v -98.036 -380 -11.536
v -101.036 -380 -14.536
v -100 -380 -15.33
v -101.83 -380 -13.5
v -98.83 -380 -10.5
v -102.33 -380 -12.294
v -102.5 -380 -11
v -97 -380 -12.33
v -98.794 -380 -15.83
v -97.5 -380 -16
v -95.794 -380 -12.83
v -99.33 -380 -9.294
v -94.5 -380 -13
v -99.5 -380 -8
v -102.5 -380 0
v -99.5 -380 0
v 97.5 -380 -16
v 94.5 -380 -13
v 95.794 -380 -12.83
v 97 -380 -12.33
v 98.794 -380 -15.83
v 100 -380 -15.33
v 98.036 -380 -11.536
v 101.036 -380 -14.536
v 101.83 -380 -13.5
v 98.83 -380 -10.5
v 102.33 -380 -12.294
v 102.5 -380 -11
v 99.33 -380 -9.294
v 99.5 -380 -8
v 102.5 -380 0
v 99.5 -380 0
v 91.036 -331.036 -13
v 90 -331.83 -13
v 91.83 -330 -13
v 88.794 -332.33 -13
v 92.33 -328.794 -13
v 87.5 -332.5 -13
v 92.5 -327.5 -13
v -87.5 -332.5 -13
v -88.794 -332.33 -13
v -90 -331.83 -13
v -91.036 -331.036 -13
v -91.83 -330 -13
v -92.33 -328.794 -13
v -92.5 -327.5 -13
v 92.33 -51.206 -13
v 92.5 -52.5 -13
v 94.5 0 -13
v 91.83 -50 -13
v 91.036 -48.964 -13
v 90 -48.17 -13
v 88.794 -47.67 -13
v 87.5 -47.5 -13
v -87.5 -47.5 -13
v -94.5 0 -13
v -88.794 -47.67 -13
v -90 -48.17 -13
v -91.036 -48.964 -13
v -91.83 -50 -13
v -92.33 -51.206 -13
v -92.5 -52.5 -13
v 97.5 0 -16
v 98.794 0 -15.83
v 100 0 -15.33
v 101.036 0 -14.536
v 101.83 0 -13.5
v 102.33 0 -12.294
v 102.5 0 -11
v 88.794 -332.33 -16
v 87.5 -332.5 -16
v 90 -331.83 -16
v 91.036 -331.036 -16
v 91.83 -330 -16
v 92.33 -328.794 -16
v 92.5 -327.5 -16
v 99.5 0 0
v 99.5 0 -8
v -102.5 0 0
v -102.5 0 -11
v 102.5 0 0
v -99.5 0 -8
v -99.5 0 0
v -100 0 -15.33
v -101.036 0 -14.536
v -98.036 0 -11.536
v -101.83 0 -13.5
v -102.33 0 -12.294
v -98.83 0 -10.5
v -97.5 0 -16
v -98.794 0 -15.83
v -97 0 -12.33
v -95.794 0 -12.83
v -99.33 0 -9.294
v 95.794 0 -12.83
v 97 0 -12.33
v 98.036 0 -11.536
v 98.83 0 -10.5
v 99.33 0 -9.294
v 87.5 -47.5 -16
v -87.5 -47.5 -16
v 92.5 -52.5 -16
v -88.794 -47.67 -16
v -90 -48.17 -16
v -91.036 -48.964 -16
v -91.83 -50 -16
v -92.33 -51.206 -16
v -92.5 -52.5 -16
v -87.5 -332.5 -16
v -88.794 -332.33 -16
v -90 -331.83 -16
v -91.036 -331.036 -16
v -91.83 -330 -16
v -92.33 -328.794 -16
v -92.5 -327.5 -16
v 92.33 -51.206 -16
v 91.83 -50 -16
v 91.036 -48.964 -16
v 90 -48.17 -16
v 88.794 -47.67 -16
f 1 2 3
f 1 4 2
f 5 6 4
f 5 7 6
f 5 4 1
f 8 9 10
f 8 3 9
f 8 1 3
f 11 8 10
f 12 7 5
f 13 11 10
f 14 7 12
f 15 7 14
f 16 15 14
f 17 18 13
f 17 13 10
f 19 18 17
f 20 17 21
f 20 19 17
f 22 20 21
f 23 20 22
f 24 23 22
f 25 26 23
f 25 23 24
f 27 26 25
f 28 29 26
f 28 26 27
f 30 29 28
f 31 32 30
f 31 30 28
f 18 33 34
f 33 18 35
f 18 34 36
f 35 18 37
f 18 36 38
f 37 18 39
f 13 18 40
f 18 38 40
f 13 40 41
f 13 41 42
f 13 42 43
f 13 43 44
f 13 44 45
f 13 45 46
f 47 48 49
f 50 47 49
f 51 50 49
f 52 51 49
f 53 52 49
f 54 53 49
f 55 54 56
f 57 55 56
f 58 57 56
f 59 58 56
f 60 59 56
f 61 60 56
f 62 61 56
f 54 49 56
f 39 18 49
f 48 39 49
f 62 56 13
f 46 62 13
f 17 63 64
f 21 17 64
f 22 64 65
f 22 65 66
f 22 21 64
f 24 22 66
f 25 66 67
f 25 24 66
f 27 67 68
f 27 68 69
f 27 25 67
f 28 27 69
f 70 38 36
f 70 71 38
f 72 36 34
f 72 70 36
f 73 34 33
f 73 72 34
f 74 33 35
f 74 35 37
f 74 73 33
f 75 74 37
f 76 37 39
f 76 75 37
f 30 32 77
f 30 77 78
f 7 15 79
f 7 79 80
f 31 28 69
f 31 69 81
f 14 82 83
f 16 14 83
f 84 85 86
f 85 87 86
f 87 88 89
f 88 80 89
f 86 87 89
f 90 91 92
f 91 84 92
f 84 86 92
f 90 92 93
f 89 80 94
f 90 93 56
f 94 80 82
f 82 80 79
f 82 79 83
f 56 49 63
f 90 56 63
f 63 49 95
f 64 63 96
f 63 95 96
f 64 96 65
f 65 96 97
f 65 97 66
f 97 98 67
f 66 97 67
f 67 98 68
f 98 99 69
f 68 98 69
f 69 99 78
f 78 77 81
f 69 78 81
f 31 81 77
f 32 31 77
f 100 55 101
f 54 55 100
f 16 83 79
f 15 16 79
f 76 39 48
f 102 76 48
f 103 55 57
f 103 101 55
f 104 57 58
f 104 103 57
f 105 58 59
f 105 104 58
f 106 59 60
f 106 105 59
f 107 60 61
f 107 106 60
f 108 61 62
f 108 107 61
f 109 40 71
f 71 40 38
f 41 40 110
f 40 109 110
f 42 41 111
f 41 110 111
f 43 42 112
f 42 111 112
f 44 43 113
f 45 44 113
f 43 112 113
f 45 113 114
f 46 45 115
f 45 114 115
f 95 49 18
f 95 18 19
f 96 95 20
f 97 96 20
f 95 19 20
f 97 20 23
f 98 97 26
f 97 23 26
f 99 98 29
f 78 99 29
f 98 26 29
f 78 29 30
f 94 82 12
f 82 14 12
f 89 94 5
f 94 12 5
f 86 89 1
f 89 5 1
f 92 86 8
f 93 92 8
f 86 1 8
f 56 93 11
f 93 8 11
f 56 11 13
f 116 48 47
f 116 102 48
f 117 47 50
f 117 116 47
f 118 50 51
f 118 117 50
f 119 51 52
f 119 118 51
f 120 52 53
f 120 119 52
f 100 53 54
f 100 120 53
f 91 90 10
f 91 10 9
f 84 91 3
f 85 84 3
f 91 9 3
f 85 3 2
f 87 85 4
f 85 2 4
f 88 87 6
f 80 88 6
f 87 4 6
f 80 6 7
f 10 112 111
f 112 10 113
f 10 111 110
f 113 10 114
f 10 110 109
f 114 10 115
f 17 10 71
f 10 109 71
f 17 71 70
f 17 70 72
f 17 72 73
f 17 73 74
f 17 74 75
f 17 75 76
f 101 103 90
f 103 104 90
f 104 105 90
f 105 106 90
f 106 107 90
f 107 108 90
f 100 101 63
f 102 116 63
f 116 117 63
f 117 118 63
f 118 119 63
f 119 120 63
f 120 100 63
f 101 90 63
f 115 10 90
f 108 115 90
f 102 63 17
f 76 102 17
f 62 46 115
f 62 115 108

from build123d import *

# Parameters (mm, degrees)
F1_DEPTH = 380
F2_W     = 185
F2_H     = 285
F3_DEPTH = 3
F4_R     = 5
F5_R     = 5
F6_R     = 5


with BuildPart() as f1:
    # F0 (on Front) → F1 (new body)
    with BuildSketch(Plane.XZ):
        Polygon((-102.5, 0), (-102.5, -16), (102.5, -16), (102.5, 0), (99.5, 0), (99.5, -13), (-99.5, -13), (-99.5, 0), align=None)
    extrude(amount=F1_DEPTH)

    # F2 (on face) → F3 (cut)
    with BuildSketch(Plane.XY.offset(-13)):
        with Locations((0, -190)):
            Rectangle(F2_W, F2_H)
    extrude(amount=-F3_DEPTH, mode=Mode.SUBTRACT)

    # F4
    f4_edges = [f1.edges().sort_by_distance(p)[0] for p in [
        (-92.5, -47.5, -14.5),
        (92.5, -47.5, -14.5),
        (-92.5, -332.5, -14.5),
        (92.5, -332.5, -14.5),
    ]]
    fillet(f4_edges, radius=F4_R)

    # F5
    f5_edges = [f1.edges().sort_by_distance(p)[0] for p in [
        (102.5, -190, -16),
        (-102.5, -190, -16),
    ]]
    fillet(f5_edges, radius=F5_R)

    # F6
    f6_edges = [f1.edges().sort_by_distance(p)[0] for p in [
        (-99.5, -190, -13),
        (99.5, -190, -13),
    ]]
    fillet(f6_edges, radius=F6_R)


solid = f1.part
